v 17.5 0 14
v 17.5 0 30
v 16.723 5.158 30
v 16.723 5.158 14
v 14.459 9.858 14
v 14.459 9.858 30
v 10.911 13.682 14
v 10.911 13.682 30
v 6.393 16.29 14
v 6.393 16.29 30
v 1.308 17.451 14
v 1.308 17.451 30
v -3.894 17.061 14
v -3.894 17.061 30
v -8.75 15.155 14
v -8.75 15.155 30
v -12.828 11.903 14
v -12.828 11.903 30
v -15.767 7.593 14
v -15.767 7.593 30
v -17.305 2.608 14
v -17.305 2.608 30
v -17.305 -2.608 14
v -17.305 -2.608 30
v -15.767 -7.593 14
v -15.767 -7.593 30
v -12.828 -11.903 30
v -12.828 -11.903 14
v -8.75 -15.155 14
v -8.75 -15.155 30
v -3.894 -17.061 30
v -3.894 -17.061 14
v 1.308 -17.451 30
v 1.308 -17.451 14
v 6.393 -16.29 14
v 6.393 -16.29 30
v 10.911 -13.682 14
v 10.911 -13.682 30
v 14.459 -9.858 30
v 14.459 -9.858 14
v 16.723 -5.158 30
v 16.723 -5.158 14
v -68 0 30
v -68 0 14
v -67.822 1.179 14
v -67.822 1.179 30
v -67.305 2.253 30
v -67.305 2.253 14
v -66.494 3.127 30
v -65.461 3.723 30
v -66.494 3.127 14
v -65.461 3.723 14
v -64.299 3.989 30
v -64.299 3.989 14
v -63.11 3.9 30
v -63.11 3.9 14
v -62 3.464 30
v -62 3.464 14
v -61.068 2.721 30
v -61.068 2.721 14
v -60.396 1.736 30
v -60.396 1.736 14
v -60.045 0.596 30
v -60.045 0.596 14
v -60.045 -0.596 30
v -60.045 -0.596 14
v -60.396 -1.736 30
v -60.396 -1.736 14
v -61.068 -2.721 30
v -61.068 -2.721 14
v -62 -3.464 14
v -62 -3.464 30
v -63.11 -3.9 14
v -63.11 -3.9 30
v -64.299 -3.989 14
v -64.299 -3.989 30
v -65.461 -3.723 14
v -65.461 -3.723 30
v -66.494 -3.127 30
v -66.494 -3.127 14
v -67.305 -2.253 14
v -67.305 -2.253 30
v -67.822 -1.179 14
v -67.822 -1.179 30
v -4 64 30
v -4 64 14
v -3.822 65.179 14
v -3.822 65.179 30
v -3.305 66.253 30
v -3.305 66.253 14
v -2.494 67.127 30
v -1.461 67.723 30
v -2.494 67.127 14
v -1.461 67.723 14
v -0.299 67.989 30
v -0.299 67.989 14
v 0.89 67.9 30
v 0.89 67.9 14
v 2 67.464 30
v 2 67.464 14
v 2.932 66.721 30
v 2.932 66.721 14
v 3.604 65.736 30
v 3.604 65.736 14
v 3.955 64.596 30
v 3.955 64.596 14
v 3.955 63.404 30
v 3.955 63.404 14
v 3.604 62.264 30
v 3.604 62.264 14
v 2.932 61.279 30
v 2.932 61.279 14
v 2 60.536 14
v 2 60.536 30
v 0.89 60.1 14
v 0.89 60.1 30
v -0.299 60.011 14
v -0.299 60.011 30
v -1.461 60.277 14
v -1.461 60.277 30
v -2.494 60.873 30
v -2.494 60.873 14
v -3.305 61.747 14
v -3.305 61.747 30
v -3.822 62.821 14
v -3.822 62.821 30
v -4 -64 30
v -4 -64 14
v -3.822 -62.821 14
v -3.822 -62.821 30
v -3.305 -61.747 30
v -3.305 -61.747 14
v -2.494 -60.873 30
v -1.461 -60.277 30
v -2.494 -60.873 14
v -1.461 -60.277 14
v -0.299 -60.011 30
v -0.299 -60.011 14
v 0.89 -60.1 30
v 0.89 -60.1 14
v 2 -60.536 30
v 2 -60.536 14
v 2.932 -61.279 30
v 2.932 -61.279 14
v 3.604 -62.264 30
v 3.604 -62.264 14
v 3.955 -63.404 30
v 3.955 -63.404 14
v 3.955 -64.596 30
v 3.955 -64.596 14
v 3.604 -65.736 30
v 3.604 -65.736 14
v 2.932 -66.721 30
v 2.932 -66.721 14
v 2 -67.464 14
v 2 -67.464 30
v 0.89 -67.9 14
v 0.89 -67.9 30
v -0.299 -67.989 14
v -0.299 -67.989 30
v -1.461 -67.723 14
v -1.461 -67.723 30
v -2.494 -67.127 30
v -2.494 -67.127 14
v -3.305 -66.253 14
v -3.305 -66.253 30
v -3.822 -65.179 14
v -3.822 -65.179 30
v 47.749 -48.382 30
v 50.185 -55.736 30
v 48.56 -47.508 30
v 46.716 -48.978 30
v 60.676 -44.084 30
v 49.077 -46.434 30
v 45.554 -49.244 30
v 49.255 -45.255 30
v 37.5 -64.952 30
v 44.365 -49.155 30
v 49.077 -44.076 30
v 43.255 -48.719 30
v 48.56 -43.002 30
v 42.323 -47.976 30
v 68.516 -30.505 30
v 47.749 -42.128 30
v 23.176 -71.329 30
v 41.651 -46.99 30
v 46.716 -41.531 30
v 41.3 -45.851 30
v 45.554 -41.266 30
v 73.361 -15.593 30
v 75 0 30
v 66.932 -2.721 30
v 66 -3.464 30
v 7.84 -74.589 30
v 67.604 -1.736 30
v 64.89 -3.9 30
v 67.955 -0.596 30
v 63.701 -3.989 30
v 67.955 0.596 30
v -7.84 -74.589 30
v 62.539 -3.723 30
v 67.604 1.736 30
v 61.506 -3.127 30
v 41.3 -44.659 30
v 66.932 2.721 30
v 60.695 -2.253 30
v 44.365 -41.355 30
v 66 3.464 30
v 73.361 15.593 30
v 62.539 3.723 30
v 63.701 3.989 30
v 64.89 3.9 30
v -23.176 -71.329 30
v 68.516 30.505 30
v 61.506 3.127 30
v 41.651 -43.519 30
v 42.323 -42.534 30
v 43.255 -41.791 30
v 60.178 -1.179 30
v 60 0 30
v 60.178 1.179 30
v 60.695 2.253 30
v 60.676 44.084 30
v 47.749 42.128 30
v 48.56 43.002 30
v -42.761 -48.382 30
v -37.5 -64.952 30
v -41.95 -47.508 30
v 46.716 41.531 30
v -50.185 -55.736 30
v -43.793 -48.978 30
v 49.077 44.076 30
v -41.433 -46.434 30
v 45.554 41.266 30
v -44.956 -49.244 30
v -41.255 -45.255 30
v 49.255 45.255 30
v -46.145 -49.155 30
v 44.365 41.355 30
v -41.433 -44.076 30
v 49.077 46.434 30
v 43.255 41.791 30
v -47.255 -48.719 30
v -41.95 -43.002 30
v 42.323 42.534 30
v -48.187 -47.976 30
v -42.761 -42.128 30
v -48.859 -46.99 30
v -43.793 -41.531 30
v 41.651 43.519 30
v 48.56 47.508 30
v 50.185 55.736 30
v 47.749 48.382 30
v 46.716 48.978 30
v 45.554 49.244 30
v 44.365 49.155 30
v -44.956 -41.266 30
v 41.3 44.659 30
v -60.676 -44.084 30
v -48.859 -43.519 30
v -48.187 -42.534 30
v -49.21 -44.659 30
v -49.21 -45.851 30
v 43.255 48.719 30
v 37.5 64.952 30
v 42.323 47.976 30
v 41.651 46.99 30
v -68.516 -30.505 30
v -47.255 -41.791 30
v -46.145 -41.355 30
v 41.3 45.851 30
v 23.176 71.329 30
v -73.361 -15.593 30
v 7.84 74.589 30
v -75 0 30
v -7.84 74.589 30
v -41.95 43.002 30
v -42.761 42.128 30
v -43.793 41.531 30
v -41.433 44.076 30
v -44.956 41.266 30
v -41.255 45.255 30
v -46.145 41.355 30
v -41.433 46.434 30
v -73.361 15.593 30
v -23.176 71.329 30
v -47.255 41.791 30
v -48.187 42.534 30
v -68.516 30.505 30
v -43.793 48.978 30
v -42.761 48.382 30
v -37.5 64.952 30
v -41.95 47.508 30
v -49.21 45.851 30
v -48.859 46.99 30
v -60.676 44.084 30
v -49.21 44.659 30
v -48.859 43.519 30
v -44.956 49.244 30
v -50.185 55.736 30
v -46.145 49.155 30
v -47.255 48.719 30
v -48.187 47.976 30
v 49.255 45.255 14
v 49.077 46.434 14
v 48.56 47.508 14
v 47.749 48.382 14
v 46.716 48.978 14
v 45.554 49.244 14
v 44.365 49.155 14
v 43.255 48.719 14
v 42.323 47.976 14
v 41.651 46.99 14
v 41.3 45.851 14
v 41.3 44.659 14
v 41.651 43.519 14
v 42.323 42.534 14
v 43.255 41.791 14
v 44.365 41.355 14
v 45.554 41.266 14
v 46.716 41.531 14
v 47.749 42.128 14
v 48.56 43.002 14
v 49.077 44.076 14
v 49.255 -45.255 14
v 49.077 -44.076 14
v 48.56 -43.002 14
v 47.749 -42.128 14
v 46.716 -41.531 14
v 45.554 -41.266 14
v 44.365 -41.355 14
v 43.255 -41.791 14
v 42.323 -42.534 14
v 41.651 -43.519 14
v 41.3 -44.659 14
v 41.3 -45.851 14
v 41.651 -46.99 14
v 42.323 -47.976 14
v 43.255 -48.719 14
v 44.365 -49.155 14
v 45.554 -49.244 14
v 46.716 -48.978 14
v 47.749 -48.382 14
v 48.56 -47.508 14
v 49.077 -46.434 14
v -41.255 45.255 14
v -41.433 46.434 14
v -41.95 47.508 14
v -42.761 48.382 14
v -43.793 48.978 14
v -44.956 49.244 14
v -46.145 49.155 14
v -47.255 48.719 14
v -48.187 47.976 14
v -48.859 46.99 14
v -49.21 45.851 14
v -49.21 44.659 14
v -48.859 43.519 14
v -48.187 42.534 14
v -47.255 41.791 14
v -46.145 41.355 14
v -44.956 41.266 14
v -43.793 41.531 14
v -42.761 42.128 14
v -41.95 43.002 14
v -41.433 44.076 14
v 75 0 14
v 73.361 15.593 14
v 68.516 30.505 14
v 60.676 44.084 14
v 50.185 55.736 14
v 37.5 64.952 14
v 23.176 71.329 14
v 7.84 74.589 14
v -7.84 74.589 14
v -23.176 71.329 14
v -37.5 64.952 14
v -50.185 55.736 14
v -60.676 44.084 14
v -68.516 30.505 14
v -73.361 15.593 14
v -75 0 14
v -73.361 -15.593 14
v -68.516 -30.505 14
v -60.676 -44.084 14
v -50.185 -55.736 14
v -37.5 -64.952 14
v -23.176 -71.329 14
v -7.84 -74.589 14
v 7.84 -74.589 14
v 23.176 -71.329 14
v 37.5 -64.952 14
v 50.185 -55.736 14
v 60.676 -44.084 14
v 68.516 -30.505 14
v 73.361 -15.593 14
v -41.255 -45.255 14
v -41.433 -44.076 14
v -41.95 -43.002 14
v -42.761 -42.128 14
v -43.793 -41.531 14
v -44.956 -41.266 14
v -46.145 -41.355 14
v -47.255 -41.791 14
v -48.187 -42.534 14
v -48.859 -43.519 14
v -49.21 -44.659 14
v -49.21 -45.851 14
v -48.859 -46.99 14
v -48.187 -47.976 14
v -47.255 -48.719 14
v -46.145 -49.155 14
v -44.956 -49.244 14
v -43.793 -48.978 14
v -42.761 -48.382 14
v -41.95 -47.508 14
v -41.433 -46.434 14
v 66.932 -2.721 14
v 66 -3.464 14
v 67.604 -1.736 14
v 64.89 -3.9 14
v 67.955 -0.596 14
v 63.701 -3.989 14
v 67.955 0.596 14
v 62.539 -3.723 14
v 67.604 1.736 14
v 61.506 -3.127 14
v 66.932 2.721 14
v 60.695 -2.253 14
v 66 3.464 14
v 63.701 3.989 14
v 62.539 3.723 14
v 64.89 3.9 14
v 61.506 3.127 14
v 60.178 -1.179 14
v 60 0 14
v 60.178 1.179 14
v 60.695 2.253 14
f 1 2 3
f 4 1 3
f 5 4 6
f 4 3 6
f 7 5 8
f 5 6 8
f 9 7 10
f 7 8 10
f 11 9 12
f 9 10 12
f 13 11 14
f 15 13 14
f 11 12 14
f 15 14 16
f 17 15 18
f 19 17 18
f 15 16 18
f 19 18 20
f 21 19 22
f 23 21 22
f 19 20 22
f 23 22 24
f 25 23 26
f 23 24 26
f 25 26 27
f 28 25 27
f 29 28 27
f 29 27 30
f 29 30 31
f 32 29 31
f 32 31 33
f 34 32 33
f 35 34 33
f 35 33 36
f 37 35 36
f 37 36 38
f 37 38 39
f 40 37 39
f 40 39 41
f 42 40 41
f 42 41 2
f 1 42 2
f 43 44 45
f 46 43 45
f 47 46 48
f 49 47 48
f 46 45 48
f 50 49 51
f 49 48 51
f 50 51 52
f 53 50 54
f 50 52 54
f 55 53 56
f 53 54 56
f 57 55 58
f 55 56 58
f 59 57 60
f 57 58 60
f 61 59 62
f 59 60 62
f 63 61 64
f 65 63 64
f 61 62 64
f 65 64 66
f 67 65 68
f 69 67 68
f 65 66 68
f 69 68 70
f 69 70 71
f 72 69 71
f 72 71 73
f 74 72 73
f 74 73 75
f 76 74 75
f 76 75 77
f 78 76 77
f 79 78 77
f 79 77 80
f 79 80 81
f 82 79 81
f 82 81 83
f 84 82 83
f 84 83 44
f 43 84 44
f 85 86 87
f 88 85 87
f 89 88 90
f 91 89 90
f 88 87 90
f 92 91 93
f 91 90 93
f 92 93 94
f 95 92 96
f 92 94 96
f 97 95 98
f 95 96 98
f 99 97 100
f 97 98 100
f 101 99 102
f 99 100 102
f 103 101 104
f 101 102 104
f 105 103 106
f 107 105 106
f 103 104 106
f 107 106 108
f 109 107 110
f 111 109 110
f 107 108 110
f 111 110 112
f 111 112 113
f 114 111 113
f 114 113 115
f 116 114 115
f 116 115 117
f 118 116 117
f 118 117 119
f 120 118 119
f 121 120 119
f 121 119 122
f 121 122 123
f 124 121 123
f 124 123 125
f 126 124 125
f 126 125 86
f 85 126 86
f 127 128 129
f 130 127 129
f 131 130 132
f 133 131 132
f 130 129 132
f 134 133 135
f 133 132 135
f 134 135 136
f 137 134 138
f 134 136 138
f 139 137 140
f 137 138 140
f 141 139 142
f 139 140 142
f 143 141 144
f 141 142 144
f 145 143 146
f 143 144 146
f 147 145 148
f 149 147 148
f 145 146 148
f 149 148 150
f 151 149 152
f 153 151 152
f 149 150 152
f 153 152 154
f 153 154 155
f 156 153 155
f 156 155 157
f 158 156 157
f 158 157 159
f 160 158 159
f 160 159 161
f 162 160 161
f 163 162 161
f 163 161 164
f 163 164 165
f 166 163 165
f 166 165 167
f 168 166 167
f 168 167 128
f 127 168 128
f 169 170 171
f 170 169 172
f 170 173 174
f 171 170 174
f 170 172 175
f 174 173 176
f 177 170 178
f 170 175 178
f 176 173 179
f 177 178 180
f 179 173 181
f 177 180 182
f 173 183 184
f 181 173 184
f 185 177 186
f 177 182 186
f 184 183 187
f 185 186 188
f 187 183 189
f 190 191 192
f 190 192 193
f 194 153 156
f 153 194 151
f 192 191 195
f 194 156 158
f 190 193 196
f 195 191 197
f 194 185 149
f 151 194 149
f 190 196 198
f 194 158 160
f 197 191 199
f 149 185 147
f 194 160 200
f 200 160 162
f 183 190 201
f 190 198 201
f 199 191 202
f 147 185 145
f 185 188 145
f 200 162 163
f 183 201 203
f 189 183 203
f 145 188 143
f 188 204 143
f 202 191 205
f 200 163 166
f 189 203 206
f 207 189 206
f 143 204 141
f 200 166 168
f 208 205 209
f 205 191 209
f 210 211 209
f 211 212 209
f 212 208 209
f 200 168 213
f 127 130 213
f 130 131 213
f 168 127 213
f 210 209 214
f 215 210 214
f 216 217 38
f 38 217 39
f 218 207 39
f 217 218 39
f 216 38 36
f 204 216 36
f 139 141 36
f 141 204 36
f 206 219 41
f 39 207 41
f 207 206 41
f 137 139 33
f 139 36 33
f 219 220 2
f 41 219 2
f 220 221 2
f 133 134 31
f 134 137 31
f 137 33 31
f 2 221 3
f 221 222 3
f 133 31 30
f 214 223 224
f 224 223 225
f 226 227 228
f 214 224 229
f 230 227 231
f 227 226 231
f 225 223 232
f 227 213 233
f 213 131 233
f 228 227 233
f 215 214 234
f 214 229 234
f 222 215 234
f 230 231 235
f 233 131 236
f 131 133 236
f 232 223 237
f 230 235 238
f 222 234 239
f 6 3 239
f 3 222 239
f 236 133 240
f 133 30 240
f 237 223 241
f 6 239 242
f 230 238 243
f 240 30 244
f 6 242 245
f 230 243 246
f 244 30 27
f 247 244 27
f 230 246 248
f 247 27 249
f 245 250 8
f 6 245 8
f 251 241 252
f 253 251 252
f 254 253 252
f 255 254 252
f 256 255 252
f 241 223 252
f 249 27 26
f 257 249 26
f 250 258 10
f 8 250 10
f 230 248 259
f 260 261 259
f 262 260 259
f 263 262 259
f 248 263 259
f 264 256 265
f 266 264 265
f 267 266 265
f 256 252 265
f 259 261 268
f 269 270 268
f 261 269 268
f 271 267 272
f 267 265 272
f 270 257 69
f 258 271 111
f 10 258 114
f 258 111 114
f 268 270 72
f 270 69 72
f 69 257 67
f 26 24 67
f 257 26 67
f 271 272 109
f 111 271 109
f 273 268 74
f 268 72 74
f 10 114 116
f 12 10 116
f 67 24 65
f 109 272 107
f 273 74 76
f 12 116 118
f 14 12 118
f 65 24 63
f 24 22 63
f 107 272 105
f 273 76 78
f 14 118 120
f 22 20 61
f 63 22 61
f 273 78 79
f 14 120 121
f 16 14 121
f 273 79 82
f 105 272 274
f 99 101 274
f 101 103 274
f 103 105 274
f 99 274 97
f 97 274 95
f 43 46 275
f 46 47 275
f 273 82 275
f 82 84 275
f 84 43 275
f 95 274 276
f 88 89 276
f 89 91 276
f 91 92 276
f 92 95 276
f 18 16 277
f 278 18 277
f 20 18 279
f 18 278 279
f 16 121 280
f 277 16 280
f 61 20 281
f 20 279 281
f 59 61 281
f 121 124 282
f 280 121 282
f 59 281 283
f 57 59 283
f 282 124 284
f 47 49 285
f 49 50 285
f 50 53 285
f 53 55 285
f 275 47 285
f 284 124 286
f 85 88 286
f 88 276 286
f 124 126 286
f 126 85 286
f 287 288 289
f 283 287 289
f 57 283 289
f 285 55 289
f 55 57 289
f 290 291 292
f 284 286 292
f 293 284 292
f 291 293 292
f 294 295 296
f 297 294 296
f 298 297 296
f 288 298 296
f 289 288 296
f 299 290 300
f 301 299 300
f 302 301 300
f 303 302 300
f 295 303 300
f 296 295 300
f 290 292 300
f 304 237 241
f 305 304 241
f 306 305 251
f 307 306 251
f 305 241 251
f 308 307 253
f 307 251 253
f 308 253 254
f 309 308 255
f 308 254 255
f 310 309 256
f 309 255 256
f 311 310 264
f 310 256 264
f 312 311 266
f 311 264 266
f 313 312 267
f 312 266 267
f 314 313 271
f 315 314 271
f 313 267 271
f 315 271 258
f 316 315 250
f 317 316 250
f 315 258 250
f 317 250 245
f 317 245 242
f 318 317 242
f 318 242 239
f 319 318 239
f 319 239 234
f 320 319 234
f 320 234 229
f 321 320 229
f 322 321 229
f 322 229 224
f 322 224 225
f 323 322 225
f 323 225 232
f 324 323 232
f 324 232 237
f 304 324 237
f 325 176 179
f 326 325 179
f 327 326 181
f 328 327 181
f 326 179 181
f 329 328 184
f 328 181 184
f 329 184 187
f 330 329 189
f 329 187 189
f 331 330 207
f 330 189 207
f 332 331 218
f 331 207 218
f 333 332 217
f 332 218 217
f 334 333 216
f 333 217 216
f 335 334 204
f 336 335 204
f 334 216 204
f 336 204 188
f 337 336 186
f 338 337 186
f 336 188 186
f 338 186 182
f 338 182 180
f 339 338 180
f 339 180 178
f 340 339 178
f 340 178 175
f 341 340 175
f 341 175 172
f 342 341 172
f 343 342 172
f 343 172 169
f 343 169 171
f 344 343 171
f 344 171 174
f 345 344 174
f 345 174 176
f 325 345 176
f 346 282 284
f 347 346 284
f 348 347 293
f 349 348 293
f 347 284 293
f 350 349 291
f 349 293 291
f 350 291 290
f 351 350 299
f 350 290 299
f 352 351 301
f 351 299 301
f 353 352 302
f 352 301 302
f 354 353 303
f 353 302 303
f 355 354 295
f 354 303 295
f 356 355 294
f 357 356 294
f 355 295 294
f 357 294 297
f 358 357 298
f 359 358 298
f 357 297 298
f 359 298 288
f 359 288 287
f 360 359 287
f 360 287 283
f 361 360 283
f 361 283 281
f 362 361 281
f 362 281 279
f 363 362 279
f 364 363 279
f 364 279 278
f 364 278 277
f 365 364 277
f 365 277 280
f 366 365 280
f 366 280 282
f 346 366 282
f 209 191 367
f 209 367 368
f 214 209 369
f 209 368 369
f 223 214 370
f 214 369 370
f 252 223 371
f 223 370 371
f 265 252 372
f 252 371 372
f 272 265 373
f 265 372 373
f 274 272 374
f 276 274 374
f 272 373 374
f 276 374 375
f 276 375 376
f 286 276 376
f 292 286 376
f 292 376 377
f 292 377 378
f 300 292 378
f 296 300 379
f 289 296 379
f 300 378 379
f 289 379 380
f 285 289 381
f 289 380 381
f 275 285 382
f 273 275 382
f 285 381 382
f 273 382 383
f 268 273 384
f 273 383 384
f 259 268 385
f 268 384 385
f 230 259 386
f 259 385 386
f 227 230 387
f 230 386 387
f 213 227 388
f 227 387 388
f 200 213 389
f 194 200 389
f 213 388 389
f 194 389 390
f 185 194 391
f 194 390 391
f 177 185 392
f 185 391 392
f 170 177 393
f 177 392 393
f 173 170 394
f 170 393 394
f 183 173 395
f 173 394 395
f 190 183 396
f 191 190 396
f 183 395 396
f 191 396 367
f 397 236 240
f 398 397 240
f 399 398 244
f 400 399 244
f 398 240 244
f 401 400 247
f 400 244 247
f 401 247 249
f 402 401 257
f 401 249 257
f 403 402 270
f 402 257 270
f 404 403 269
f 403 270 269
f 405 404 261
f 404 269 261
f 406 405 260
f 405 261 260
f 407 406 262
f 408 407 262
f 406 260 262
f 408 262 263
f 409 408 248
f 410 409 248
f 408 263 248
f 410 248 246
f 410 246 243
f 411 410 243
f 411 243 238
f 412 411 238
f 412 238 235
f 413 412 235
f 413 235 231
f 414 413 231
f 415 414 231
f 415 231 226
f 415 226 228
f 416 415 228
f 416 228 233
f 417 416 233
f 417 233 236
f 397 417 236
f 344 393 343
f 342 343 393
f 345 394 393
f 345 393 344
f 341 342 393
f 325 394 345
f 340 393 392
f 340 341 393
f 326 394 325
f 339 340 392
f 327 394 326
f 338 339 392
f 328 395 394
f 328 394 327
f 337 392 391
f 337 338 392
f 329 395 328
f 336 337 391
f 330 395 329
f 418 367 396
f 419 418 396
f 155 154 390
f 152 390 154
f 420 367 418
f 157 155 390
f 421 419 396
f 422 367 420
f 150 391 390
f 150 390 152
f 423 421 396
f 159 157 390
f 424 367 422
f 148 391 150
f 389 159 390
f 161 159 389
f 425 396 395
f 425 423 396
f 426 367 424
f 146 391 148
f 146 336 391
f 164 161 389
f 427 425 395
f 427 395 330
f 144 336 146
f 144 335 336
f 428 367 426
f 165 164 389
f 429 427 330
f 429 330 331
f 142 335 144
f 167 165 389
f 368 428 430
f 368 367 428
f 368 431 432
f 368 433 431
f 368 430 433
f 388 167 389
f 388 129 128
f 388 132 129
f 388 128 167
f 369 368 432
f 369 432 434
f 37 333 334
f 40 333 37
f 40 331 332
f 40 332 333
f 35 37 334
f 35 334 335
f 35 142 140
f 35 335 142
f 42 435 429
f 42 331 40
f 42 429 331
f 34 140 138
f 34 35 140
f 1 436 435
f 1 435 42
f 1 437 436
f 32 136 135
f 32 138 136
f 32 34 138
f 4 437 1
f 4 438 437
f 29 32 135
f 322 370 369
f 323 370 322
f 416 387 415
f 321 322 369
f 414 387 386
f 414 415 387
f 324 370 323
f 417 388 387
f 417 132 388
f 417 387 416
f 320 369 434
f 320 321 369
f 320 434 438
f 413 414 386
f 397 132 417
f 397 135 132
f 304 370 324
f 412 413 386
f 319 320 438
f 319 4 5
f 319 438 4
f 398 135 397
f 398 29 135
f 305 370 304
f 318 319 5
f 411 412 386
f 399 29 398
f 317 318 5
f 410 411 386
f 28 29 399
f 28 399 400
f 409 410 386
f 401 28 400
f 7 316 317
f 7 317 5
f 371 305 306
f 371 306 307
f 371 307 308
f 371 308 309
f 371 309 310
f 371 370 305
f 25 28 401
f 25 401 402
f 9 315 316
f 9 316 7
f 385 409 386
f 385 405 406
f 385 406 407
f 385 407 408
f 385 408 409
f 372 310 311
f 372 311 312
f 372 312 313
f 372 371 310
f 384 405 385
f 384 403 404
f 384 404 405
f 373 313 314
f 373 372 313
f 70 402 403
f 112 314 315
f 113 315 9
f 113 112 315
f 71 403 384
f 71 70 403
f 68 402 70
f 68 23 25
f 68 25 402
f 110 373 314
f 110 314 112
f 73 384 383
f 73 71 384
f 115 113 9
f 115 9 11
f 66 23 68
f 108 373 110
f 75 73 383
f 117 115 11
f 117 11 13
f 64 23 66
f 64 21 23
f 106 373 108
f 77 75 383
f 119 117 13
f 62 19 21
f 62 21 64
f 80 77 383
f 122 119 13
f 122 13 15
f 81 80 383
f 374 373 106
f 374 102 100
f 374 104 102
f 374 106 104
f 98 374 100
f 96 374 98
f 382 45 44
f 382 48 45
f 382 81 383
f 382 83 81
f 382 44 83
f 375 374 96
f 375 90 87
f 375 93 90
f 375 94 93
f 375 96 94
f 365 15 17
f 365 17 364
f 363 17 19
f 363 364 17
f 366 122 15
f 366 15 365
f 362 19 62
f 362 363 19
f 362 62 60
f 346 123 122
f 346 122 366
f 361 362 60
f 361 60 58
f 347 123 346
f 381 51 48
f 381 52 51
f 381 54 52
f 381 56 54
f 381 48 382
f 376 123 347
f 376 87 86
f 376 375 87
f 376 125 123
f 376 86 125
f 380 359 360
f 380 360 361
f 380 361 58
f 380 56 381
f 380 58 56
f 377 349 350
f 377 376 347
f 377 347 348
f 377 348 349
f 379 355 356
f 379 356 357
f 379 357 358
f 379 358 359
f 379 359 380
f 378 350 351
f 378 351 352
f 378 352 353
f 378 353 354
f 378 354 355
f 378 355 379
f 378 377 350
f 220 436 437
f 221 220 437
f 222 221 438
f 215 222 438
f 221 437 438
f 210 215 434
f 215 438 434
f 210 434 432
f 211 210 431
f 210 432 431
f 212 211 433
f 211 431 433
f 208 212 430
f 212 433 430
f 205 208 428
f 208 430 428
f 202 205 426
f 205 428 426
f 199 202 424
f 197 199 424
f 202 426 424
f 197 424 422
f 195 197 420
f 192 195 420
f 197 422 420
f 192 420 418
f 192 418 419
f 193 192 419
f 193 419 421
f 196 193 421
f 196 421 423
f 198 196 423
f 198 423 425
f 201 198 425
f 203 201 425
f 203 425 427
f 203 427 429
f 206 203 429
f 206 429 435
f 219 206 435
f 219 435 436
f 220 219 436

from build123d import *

# Parameters (mm, degrees)
SKETCH1_W                    = 75
SKETCH1_H                    = 16
F_8_0_8_DIAMETER_HOLE1_D     = 8
F_8_0_8_DIAMETER_HOLE1_DEPTH = 30
F_8_0_8_DIAMETER_HOLE1_TIP   = 2.403442476
M6_CLEARANCE_HOLE1_D         = 8
M6_CLEARANCE_HOLE1_DEPTH     = 22
M6_CLEARANCE_HOLE1_TIP       = 2.403442476
SKETCH8_R                    = 17.5
CUT_EXTRUDE1_DEPTH           = 30


with BuildPart() as part:
    # Sketch1 → Revolve1 (revolve)
    with BuildSketch(Plane(origin=(0, 0, 0), x_dir=(1, 0, 0), z_dir=(0, 1, 0))):
        with Locations((37.5, -22)):
            Rectangle(SKETCH1_W, SKETCH1_H)
    revolve(axis=Axis((0, 0, 14), (0, 0, 1)))

    # Ø8.0 (8) Diameter Hole1
    with Locations(Plane(origin=(0, 0, 14), x_dir=(-1, 0, 0), z_dir=(0, 0, -1))):
        with Locations((45.254833996, 45.254833996), (-45.254833996, 45.254833996), (-45.254833996, -45.254833996), (45.254833996, -45.254833996)):
            Hole(F_8_0_8_DIAMETER_HOLE1_D / 2, depth=F_8_0_8_DIAMETER_HOLE1_DEPTH)
            with Locations((0, 0, -(F_8_0_8_DIAMETER_HOLE1_DEPTH + F_8_0_8_DIAMETER_HOLE1_TIP / 2))):  # 118° drill point
                Cone(0, F_8_0_8_DIAMETER_HOLE1_D / 2, F_8_0_8_DIAMETER_HOLE1_TIP, mode=Mode.SUBTRACT)

    # M6 Clearance Hole1
    with Locations(Plane.XY.offset(30)):
        with Locations((0, 64), (0, -64), (64, 0), (-64, 0)):
            Hole(M6_CLEARANCE_HOLE1_D / 2, depth=M6_CLEARANCE_HOLE1_DEPTH)
            with Locations((0, 0, -(M6_CLEARANCE_HOLE1_DEPTH + M6_CLEARANCE_HOLE1_TIP / 2))):  # 118° drill point
                Cone(0, M6_CLEARANCE_HOLE1_D / 2, M6_CLEARANCE_HOLE1_TIP, mode=Mode.SUBTRACT)

    # Sketch8 → Cut-Extrude1 (cut)
    with BuildSketch(Plane.XY.offset(30)):
        Circle(SKETCH8_R)
    extrude(amount=-CUT_EXTRUDE1_DEPTH, mode=Mode.SUBTRACT)


solid = part.part
